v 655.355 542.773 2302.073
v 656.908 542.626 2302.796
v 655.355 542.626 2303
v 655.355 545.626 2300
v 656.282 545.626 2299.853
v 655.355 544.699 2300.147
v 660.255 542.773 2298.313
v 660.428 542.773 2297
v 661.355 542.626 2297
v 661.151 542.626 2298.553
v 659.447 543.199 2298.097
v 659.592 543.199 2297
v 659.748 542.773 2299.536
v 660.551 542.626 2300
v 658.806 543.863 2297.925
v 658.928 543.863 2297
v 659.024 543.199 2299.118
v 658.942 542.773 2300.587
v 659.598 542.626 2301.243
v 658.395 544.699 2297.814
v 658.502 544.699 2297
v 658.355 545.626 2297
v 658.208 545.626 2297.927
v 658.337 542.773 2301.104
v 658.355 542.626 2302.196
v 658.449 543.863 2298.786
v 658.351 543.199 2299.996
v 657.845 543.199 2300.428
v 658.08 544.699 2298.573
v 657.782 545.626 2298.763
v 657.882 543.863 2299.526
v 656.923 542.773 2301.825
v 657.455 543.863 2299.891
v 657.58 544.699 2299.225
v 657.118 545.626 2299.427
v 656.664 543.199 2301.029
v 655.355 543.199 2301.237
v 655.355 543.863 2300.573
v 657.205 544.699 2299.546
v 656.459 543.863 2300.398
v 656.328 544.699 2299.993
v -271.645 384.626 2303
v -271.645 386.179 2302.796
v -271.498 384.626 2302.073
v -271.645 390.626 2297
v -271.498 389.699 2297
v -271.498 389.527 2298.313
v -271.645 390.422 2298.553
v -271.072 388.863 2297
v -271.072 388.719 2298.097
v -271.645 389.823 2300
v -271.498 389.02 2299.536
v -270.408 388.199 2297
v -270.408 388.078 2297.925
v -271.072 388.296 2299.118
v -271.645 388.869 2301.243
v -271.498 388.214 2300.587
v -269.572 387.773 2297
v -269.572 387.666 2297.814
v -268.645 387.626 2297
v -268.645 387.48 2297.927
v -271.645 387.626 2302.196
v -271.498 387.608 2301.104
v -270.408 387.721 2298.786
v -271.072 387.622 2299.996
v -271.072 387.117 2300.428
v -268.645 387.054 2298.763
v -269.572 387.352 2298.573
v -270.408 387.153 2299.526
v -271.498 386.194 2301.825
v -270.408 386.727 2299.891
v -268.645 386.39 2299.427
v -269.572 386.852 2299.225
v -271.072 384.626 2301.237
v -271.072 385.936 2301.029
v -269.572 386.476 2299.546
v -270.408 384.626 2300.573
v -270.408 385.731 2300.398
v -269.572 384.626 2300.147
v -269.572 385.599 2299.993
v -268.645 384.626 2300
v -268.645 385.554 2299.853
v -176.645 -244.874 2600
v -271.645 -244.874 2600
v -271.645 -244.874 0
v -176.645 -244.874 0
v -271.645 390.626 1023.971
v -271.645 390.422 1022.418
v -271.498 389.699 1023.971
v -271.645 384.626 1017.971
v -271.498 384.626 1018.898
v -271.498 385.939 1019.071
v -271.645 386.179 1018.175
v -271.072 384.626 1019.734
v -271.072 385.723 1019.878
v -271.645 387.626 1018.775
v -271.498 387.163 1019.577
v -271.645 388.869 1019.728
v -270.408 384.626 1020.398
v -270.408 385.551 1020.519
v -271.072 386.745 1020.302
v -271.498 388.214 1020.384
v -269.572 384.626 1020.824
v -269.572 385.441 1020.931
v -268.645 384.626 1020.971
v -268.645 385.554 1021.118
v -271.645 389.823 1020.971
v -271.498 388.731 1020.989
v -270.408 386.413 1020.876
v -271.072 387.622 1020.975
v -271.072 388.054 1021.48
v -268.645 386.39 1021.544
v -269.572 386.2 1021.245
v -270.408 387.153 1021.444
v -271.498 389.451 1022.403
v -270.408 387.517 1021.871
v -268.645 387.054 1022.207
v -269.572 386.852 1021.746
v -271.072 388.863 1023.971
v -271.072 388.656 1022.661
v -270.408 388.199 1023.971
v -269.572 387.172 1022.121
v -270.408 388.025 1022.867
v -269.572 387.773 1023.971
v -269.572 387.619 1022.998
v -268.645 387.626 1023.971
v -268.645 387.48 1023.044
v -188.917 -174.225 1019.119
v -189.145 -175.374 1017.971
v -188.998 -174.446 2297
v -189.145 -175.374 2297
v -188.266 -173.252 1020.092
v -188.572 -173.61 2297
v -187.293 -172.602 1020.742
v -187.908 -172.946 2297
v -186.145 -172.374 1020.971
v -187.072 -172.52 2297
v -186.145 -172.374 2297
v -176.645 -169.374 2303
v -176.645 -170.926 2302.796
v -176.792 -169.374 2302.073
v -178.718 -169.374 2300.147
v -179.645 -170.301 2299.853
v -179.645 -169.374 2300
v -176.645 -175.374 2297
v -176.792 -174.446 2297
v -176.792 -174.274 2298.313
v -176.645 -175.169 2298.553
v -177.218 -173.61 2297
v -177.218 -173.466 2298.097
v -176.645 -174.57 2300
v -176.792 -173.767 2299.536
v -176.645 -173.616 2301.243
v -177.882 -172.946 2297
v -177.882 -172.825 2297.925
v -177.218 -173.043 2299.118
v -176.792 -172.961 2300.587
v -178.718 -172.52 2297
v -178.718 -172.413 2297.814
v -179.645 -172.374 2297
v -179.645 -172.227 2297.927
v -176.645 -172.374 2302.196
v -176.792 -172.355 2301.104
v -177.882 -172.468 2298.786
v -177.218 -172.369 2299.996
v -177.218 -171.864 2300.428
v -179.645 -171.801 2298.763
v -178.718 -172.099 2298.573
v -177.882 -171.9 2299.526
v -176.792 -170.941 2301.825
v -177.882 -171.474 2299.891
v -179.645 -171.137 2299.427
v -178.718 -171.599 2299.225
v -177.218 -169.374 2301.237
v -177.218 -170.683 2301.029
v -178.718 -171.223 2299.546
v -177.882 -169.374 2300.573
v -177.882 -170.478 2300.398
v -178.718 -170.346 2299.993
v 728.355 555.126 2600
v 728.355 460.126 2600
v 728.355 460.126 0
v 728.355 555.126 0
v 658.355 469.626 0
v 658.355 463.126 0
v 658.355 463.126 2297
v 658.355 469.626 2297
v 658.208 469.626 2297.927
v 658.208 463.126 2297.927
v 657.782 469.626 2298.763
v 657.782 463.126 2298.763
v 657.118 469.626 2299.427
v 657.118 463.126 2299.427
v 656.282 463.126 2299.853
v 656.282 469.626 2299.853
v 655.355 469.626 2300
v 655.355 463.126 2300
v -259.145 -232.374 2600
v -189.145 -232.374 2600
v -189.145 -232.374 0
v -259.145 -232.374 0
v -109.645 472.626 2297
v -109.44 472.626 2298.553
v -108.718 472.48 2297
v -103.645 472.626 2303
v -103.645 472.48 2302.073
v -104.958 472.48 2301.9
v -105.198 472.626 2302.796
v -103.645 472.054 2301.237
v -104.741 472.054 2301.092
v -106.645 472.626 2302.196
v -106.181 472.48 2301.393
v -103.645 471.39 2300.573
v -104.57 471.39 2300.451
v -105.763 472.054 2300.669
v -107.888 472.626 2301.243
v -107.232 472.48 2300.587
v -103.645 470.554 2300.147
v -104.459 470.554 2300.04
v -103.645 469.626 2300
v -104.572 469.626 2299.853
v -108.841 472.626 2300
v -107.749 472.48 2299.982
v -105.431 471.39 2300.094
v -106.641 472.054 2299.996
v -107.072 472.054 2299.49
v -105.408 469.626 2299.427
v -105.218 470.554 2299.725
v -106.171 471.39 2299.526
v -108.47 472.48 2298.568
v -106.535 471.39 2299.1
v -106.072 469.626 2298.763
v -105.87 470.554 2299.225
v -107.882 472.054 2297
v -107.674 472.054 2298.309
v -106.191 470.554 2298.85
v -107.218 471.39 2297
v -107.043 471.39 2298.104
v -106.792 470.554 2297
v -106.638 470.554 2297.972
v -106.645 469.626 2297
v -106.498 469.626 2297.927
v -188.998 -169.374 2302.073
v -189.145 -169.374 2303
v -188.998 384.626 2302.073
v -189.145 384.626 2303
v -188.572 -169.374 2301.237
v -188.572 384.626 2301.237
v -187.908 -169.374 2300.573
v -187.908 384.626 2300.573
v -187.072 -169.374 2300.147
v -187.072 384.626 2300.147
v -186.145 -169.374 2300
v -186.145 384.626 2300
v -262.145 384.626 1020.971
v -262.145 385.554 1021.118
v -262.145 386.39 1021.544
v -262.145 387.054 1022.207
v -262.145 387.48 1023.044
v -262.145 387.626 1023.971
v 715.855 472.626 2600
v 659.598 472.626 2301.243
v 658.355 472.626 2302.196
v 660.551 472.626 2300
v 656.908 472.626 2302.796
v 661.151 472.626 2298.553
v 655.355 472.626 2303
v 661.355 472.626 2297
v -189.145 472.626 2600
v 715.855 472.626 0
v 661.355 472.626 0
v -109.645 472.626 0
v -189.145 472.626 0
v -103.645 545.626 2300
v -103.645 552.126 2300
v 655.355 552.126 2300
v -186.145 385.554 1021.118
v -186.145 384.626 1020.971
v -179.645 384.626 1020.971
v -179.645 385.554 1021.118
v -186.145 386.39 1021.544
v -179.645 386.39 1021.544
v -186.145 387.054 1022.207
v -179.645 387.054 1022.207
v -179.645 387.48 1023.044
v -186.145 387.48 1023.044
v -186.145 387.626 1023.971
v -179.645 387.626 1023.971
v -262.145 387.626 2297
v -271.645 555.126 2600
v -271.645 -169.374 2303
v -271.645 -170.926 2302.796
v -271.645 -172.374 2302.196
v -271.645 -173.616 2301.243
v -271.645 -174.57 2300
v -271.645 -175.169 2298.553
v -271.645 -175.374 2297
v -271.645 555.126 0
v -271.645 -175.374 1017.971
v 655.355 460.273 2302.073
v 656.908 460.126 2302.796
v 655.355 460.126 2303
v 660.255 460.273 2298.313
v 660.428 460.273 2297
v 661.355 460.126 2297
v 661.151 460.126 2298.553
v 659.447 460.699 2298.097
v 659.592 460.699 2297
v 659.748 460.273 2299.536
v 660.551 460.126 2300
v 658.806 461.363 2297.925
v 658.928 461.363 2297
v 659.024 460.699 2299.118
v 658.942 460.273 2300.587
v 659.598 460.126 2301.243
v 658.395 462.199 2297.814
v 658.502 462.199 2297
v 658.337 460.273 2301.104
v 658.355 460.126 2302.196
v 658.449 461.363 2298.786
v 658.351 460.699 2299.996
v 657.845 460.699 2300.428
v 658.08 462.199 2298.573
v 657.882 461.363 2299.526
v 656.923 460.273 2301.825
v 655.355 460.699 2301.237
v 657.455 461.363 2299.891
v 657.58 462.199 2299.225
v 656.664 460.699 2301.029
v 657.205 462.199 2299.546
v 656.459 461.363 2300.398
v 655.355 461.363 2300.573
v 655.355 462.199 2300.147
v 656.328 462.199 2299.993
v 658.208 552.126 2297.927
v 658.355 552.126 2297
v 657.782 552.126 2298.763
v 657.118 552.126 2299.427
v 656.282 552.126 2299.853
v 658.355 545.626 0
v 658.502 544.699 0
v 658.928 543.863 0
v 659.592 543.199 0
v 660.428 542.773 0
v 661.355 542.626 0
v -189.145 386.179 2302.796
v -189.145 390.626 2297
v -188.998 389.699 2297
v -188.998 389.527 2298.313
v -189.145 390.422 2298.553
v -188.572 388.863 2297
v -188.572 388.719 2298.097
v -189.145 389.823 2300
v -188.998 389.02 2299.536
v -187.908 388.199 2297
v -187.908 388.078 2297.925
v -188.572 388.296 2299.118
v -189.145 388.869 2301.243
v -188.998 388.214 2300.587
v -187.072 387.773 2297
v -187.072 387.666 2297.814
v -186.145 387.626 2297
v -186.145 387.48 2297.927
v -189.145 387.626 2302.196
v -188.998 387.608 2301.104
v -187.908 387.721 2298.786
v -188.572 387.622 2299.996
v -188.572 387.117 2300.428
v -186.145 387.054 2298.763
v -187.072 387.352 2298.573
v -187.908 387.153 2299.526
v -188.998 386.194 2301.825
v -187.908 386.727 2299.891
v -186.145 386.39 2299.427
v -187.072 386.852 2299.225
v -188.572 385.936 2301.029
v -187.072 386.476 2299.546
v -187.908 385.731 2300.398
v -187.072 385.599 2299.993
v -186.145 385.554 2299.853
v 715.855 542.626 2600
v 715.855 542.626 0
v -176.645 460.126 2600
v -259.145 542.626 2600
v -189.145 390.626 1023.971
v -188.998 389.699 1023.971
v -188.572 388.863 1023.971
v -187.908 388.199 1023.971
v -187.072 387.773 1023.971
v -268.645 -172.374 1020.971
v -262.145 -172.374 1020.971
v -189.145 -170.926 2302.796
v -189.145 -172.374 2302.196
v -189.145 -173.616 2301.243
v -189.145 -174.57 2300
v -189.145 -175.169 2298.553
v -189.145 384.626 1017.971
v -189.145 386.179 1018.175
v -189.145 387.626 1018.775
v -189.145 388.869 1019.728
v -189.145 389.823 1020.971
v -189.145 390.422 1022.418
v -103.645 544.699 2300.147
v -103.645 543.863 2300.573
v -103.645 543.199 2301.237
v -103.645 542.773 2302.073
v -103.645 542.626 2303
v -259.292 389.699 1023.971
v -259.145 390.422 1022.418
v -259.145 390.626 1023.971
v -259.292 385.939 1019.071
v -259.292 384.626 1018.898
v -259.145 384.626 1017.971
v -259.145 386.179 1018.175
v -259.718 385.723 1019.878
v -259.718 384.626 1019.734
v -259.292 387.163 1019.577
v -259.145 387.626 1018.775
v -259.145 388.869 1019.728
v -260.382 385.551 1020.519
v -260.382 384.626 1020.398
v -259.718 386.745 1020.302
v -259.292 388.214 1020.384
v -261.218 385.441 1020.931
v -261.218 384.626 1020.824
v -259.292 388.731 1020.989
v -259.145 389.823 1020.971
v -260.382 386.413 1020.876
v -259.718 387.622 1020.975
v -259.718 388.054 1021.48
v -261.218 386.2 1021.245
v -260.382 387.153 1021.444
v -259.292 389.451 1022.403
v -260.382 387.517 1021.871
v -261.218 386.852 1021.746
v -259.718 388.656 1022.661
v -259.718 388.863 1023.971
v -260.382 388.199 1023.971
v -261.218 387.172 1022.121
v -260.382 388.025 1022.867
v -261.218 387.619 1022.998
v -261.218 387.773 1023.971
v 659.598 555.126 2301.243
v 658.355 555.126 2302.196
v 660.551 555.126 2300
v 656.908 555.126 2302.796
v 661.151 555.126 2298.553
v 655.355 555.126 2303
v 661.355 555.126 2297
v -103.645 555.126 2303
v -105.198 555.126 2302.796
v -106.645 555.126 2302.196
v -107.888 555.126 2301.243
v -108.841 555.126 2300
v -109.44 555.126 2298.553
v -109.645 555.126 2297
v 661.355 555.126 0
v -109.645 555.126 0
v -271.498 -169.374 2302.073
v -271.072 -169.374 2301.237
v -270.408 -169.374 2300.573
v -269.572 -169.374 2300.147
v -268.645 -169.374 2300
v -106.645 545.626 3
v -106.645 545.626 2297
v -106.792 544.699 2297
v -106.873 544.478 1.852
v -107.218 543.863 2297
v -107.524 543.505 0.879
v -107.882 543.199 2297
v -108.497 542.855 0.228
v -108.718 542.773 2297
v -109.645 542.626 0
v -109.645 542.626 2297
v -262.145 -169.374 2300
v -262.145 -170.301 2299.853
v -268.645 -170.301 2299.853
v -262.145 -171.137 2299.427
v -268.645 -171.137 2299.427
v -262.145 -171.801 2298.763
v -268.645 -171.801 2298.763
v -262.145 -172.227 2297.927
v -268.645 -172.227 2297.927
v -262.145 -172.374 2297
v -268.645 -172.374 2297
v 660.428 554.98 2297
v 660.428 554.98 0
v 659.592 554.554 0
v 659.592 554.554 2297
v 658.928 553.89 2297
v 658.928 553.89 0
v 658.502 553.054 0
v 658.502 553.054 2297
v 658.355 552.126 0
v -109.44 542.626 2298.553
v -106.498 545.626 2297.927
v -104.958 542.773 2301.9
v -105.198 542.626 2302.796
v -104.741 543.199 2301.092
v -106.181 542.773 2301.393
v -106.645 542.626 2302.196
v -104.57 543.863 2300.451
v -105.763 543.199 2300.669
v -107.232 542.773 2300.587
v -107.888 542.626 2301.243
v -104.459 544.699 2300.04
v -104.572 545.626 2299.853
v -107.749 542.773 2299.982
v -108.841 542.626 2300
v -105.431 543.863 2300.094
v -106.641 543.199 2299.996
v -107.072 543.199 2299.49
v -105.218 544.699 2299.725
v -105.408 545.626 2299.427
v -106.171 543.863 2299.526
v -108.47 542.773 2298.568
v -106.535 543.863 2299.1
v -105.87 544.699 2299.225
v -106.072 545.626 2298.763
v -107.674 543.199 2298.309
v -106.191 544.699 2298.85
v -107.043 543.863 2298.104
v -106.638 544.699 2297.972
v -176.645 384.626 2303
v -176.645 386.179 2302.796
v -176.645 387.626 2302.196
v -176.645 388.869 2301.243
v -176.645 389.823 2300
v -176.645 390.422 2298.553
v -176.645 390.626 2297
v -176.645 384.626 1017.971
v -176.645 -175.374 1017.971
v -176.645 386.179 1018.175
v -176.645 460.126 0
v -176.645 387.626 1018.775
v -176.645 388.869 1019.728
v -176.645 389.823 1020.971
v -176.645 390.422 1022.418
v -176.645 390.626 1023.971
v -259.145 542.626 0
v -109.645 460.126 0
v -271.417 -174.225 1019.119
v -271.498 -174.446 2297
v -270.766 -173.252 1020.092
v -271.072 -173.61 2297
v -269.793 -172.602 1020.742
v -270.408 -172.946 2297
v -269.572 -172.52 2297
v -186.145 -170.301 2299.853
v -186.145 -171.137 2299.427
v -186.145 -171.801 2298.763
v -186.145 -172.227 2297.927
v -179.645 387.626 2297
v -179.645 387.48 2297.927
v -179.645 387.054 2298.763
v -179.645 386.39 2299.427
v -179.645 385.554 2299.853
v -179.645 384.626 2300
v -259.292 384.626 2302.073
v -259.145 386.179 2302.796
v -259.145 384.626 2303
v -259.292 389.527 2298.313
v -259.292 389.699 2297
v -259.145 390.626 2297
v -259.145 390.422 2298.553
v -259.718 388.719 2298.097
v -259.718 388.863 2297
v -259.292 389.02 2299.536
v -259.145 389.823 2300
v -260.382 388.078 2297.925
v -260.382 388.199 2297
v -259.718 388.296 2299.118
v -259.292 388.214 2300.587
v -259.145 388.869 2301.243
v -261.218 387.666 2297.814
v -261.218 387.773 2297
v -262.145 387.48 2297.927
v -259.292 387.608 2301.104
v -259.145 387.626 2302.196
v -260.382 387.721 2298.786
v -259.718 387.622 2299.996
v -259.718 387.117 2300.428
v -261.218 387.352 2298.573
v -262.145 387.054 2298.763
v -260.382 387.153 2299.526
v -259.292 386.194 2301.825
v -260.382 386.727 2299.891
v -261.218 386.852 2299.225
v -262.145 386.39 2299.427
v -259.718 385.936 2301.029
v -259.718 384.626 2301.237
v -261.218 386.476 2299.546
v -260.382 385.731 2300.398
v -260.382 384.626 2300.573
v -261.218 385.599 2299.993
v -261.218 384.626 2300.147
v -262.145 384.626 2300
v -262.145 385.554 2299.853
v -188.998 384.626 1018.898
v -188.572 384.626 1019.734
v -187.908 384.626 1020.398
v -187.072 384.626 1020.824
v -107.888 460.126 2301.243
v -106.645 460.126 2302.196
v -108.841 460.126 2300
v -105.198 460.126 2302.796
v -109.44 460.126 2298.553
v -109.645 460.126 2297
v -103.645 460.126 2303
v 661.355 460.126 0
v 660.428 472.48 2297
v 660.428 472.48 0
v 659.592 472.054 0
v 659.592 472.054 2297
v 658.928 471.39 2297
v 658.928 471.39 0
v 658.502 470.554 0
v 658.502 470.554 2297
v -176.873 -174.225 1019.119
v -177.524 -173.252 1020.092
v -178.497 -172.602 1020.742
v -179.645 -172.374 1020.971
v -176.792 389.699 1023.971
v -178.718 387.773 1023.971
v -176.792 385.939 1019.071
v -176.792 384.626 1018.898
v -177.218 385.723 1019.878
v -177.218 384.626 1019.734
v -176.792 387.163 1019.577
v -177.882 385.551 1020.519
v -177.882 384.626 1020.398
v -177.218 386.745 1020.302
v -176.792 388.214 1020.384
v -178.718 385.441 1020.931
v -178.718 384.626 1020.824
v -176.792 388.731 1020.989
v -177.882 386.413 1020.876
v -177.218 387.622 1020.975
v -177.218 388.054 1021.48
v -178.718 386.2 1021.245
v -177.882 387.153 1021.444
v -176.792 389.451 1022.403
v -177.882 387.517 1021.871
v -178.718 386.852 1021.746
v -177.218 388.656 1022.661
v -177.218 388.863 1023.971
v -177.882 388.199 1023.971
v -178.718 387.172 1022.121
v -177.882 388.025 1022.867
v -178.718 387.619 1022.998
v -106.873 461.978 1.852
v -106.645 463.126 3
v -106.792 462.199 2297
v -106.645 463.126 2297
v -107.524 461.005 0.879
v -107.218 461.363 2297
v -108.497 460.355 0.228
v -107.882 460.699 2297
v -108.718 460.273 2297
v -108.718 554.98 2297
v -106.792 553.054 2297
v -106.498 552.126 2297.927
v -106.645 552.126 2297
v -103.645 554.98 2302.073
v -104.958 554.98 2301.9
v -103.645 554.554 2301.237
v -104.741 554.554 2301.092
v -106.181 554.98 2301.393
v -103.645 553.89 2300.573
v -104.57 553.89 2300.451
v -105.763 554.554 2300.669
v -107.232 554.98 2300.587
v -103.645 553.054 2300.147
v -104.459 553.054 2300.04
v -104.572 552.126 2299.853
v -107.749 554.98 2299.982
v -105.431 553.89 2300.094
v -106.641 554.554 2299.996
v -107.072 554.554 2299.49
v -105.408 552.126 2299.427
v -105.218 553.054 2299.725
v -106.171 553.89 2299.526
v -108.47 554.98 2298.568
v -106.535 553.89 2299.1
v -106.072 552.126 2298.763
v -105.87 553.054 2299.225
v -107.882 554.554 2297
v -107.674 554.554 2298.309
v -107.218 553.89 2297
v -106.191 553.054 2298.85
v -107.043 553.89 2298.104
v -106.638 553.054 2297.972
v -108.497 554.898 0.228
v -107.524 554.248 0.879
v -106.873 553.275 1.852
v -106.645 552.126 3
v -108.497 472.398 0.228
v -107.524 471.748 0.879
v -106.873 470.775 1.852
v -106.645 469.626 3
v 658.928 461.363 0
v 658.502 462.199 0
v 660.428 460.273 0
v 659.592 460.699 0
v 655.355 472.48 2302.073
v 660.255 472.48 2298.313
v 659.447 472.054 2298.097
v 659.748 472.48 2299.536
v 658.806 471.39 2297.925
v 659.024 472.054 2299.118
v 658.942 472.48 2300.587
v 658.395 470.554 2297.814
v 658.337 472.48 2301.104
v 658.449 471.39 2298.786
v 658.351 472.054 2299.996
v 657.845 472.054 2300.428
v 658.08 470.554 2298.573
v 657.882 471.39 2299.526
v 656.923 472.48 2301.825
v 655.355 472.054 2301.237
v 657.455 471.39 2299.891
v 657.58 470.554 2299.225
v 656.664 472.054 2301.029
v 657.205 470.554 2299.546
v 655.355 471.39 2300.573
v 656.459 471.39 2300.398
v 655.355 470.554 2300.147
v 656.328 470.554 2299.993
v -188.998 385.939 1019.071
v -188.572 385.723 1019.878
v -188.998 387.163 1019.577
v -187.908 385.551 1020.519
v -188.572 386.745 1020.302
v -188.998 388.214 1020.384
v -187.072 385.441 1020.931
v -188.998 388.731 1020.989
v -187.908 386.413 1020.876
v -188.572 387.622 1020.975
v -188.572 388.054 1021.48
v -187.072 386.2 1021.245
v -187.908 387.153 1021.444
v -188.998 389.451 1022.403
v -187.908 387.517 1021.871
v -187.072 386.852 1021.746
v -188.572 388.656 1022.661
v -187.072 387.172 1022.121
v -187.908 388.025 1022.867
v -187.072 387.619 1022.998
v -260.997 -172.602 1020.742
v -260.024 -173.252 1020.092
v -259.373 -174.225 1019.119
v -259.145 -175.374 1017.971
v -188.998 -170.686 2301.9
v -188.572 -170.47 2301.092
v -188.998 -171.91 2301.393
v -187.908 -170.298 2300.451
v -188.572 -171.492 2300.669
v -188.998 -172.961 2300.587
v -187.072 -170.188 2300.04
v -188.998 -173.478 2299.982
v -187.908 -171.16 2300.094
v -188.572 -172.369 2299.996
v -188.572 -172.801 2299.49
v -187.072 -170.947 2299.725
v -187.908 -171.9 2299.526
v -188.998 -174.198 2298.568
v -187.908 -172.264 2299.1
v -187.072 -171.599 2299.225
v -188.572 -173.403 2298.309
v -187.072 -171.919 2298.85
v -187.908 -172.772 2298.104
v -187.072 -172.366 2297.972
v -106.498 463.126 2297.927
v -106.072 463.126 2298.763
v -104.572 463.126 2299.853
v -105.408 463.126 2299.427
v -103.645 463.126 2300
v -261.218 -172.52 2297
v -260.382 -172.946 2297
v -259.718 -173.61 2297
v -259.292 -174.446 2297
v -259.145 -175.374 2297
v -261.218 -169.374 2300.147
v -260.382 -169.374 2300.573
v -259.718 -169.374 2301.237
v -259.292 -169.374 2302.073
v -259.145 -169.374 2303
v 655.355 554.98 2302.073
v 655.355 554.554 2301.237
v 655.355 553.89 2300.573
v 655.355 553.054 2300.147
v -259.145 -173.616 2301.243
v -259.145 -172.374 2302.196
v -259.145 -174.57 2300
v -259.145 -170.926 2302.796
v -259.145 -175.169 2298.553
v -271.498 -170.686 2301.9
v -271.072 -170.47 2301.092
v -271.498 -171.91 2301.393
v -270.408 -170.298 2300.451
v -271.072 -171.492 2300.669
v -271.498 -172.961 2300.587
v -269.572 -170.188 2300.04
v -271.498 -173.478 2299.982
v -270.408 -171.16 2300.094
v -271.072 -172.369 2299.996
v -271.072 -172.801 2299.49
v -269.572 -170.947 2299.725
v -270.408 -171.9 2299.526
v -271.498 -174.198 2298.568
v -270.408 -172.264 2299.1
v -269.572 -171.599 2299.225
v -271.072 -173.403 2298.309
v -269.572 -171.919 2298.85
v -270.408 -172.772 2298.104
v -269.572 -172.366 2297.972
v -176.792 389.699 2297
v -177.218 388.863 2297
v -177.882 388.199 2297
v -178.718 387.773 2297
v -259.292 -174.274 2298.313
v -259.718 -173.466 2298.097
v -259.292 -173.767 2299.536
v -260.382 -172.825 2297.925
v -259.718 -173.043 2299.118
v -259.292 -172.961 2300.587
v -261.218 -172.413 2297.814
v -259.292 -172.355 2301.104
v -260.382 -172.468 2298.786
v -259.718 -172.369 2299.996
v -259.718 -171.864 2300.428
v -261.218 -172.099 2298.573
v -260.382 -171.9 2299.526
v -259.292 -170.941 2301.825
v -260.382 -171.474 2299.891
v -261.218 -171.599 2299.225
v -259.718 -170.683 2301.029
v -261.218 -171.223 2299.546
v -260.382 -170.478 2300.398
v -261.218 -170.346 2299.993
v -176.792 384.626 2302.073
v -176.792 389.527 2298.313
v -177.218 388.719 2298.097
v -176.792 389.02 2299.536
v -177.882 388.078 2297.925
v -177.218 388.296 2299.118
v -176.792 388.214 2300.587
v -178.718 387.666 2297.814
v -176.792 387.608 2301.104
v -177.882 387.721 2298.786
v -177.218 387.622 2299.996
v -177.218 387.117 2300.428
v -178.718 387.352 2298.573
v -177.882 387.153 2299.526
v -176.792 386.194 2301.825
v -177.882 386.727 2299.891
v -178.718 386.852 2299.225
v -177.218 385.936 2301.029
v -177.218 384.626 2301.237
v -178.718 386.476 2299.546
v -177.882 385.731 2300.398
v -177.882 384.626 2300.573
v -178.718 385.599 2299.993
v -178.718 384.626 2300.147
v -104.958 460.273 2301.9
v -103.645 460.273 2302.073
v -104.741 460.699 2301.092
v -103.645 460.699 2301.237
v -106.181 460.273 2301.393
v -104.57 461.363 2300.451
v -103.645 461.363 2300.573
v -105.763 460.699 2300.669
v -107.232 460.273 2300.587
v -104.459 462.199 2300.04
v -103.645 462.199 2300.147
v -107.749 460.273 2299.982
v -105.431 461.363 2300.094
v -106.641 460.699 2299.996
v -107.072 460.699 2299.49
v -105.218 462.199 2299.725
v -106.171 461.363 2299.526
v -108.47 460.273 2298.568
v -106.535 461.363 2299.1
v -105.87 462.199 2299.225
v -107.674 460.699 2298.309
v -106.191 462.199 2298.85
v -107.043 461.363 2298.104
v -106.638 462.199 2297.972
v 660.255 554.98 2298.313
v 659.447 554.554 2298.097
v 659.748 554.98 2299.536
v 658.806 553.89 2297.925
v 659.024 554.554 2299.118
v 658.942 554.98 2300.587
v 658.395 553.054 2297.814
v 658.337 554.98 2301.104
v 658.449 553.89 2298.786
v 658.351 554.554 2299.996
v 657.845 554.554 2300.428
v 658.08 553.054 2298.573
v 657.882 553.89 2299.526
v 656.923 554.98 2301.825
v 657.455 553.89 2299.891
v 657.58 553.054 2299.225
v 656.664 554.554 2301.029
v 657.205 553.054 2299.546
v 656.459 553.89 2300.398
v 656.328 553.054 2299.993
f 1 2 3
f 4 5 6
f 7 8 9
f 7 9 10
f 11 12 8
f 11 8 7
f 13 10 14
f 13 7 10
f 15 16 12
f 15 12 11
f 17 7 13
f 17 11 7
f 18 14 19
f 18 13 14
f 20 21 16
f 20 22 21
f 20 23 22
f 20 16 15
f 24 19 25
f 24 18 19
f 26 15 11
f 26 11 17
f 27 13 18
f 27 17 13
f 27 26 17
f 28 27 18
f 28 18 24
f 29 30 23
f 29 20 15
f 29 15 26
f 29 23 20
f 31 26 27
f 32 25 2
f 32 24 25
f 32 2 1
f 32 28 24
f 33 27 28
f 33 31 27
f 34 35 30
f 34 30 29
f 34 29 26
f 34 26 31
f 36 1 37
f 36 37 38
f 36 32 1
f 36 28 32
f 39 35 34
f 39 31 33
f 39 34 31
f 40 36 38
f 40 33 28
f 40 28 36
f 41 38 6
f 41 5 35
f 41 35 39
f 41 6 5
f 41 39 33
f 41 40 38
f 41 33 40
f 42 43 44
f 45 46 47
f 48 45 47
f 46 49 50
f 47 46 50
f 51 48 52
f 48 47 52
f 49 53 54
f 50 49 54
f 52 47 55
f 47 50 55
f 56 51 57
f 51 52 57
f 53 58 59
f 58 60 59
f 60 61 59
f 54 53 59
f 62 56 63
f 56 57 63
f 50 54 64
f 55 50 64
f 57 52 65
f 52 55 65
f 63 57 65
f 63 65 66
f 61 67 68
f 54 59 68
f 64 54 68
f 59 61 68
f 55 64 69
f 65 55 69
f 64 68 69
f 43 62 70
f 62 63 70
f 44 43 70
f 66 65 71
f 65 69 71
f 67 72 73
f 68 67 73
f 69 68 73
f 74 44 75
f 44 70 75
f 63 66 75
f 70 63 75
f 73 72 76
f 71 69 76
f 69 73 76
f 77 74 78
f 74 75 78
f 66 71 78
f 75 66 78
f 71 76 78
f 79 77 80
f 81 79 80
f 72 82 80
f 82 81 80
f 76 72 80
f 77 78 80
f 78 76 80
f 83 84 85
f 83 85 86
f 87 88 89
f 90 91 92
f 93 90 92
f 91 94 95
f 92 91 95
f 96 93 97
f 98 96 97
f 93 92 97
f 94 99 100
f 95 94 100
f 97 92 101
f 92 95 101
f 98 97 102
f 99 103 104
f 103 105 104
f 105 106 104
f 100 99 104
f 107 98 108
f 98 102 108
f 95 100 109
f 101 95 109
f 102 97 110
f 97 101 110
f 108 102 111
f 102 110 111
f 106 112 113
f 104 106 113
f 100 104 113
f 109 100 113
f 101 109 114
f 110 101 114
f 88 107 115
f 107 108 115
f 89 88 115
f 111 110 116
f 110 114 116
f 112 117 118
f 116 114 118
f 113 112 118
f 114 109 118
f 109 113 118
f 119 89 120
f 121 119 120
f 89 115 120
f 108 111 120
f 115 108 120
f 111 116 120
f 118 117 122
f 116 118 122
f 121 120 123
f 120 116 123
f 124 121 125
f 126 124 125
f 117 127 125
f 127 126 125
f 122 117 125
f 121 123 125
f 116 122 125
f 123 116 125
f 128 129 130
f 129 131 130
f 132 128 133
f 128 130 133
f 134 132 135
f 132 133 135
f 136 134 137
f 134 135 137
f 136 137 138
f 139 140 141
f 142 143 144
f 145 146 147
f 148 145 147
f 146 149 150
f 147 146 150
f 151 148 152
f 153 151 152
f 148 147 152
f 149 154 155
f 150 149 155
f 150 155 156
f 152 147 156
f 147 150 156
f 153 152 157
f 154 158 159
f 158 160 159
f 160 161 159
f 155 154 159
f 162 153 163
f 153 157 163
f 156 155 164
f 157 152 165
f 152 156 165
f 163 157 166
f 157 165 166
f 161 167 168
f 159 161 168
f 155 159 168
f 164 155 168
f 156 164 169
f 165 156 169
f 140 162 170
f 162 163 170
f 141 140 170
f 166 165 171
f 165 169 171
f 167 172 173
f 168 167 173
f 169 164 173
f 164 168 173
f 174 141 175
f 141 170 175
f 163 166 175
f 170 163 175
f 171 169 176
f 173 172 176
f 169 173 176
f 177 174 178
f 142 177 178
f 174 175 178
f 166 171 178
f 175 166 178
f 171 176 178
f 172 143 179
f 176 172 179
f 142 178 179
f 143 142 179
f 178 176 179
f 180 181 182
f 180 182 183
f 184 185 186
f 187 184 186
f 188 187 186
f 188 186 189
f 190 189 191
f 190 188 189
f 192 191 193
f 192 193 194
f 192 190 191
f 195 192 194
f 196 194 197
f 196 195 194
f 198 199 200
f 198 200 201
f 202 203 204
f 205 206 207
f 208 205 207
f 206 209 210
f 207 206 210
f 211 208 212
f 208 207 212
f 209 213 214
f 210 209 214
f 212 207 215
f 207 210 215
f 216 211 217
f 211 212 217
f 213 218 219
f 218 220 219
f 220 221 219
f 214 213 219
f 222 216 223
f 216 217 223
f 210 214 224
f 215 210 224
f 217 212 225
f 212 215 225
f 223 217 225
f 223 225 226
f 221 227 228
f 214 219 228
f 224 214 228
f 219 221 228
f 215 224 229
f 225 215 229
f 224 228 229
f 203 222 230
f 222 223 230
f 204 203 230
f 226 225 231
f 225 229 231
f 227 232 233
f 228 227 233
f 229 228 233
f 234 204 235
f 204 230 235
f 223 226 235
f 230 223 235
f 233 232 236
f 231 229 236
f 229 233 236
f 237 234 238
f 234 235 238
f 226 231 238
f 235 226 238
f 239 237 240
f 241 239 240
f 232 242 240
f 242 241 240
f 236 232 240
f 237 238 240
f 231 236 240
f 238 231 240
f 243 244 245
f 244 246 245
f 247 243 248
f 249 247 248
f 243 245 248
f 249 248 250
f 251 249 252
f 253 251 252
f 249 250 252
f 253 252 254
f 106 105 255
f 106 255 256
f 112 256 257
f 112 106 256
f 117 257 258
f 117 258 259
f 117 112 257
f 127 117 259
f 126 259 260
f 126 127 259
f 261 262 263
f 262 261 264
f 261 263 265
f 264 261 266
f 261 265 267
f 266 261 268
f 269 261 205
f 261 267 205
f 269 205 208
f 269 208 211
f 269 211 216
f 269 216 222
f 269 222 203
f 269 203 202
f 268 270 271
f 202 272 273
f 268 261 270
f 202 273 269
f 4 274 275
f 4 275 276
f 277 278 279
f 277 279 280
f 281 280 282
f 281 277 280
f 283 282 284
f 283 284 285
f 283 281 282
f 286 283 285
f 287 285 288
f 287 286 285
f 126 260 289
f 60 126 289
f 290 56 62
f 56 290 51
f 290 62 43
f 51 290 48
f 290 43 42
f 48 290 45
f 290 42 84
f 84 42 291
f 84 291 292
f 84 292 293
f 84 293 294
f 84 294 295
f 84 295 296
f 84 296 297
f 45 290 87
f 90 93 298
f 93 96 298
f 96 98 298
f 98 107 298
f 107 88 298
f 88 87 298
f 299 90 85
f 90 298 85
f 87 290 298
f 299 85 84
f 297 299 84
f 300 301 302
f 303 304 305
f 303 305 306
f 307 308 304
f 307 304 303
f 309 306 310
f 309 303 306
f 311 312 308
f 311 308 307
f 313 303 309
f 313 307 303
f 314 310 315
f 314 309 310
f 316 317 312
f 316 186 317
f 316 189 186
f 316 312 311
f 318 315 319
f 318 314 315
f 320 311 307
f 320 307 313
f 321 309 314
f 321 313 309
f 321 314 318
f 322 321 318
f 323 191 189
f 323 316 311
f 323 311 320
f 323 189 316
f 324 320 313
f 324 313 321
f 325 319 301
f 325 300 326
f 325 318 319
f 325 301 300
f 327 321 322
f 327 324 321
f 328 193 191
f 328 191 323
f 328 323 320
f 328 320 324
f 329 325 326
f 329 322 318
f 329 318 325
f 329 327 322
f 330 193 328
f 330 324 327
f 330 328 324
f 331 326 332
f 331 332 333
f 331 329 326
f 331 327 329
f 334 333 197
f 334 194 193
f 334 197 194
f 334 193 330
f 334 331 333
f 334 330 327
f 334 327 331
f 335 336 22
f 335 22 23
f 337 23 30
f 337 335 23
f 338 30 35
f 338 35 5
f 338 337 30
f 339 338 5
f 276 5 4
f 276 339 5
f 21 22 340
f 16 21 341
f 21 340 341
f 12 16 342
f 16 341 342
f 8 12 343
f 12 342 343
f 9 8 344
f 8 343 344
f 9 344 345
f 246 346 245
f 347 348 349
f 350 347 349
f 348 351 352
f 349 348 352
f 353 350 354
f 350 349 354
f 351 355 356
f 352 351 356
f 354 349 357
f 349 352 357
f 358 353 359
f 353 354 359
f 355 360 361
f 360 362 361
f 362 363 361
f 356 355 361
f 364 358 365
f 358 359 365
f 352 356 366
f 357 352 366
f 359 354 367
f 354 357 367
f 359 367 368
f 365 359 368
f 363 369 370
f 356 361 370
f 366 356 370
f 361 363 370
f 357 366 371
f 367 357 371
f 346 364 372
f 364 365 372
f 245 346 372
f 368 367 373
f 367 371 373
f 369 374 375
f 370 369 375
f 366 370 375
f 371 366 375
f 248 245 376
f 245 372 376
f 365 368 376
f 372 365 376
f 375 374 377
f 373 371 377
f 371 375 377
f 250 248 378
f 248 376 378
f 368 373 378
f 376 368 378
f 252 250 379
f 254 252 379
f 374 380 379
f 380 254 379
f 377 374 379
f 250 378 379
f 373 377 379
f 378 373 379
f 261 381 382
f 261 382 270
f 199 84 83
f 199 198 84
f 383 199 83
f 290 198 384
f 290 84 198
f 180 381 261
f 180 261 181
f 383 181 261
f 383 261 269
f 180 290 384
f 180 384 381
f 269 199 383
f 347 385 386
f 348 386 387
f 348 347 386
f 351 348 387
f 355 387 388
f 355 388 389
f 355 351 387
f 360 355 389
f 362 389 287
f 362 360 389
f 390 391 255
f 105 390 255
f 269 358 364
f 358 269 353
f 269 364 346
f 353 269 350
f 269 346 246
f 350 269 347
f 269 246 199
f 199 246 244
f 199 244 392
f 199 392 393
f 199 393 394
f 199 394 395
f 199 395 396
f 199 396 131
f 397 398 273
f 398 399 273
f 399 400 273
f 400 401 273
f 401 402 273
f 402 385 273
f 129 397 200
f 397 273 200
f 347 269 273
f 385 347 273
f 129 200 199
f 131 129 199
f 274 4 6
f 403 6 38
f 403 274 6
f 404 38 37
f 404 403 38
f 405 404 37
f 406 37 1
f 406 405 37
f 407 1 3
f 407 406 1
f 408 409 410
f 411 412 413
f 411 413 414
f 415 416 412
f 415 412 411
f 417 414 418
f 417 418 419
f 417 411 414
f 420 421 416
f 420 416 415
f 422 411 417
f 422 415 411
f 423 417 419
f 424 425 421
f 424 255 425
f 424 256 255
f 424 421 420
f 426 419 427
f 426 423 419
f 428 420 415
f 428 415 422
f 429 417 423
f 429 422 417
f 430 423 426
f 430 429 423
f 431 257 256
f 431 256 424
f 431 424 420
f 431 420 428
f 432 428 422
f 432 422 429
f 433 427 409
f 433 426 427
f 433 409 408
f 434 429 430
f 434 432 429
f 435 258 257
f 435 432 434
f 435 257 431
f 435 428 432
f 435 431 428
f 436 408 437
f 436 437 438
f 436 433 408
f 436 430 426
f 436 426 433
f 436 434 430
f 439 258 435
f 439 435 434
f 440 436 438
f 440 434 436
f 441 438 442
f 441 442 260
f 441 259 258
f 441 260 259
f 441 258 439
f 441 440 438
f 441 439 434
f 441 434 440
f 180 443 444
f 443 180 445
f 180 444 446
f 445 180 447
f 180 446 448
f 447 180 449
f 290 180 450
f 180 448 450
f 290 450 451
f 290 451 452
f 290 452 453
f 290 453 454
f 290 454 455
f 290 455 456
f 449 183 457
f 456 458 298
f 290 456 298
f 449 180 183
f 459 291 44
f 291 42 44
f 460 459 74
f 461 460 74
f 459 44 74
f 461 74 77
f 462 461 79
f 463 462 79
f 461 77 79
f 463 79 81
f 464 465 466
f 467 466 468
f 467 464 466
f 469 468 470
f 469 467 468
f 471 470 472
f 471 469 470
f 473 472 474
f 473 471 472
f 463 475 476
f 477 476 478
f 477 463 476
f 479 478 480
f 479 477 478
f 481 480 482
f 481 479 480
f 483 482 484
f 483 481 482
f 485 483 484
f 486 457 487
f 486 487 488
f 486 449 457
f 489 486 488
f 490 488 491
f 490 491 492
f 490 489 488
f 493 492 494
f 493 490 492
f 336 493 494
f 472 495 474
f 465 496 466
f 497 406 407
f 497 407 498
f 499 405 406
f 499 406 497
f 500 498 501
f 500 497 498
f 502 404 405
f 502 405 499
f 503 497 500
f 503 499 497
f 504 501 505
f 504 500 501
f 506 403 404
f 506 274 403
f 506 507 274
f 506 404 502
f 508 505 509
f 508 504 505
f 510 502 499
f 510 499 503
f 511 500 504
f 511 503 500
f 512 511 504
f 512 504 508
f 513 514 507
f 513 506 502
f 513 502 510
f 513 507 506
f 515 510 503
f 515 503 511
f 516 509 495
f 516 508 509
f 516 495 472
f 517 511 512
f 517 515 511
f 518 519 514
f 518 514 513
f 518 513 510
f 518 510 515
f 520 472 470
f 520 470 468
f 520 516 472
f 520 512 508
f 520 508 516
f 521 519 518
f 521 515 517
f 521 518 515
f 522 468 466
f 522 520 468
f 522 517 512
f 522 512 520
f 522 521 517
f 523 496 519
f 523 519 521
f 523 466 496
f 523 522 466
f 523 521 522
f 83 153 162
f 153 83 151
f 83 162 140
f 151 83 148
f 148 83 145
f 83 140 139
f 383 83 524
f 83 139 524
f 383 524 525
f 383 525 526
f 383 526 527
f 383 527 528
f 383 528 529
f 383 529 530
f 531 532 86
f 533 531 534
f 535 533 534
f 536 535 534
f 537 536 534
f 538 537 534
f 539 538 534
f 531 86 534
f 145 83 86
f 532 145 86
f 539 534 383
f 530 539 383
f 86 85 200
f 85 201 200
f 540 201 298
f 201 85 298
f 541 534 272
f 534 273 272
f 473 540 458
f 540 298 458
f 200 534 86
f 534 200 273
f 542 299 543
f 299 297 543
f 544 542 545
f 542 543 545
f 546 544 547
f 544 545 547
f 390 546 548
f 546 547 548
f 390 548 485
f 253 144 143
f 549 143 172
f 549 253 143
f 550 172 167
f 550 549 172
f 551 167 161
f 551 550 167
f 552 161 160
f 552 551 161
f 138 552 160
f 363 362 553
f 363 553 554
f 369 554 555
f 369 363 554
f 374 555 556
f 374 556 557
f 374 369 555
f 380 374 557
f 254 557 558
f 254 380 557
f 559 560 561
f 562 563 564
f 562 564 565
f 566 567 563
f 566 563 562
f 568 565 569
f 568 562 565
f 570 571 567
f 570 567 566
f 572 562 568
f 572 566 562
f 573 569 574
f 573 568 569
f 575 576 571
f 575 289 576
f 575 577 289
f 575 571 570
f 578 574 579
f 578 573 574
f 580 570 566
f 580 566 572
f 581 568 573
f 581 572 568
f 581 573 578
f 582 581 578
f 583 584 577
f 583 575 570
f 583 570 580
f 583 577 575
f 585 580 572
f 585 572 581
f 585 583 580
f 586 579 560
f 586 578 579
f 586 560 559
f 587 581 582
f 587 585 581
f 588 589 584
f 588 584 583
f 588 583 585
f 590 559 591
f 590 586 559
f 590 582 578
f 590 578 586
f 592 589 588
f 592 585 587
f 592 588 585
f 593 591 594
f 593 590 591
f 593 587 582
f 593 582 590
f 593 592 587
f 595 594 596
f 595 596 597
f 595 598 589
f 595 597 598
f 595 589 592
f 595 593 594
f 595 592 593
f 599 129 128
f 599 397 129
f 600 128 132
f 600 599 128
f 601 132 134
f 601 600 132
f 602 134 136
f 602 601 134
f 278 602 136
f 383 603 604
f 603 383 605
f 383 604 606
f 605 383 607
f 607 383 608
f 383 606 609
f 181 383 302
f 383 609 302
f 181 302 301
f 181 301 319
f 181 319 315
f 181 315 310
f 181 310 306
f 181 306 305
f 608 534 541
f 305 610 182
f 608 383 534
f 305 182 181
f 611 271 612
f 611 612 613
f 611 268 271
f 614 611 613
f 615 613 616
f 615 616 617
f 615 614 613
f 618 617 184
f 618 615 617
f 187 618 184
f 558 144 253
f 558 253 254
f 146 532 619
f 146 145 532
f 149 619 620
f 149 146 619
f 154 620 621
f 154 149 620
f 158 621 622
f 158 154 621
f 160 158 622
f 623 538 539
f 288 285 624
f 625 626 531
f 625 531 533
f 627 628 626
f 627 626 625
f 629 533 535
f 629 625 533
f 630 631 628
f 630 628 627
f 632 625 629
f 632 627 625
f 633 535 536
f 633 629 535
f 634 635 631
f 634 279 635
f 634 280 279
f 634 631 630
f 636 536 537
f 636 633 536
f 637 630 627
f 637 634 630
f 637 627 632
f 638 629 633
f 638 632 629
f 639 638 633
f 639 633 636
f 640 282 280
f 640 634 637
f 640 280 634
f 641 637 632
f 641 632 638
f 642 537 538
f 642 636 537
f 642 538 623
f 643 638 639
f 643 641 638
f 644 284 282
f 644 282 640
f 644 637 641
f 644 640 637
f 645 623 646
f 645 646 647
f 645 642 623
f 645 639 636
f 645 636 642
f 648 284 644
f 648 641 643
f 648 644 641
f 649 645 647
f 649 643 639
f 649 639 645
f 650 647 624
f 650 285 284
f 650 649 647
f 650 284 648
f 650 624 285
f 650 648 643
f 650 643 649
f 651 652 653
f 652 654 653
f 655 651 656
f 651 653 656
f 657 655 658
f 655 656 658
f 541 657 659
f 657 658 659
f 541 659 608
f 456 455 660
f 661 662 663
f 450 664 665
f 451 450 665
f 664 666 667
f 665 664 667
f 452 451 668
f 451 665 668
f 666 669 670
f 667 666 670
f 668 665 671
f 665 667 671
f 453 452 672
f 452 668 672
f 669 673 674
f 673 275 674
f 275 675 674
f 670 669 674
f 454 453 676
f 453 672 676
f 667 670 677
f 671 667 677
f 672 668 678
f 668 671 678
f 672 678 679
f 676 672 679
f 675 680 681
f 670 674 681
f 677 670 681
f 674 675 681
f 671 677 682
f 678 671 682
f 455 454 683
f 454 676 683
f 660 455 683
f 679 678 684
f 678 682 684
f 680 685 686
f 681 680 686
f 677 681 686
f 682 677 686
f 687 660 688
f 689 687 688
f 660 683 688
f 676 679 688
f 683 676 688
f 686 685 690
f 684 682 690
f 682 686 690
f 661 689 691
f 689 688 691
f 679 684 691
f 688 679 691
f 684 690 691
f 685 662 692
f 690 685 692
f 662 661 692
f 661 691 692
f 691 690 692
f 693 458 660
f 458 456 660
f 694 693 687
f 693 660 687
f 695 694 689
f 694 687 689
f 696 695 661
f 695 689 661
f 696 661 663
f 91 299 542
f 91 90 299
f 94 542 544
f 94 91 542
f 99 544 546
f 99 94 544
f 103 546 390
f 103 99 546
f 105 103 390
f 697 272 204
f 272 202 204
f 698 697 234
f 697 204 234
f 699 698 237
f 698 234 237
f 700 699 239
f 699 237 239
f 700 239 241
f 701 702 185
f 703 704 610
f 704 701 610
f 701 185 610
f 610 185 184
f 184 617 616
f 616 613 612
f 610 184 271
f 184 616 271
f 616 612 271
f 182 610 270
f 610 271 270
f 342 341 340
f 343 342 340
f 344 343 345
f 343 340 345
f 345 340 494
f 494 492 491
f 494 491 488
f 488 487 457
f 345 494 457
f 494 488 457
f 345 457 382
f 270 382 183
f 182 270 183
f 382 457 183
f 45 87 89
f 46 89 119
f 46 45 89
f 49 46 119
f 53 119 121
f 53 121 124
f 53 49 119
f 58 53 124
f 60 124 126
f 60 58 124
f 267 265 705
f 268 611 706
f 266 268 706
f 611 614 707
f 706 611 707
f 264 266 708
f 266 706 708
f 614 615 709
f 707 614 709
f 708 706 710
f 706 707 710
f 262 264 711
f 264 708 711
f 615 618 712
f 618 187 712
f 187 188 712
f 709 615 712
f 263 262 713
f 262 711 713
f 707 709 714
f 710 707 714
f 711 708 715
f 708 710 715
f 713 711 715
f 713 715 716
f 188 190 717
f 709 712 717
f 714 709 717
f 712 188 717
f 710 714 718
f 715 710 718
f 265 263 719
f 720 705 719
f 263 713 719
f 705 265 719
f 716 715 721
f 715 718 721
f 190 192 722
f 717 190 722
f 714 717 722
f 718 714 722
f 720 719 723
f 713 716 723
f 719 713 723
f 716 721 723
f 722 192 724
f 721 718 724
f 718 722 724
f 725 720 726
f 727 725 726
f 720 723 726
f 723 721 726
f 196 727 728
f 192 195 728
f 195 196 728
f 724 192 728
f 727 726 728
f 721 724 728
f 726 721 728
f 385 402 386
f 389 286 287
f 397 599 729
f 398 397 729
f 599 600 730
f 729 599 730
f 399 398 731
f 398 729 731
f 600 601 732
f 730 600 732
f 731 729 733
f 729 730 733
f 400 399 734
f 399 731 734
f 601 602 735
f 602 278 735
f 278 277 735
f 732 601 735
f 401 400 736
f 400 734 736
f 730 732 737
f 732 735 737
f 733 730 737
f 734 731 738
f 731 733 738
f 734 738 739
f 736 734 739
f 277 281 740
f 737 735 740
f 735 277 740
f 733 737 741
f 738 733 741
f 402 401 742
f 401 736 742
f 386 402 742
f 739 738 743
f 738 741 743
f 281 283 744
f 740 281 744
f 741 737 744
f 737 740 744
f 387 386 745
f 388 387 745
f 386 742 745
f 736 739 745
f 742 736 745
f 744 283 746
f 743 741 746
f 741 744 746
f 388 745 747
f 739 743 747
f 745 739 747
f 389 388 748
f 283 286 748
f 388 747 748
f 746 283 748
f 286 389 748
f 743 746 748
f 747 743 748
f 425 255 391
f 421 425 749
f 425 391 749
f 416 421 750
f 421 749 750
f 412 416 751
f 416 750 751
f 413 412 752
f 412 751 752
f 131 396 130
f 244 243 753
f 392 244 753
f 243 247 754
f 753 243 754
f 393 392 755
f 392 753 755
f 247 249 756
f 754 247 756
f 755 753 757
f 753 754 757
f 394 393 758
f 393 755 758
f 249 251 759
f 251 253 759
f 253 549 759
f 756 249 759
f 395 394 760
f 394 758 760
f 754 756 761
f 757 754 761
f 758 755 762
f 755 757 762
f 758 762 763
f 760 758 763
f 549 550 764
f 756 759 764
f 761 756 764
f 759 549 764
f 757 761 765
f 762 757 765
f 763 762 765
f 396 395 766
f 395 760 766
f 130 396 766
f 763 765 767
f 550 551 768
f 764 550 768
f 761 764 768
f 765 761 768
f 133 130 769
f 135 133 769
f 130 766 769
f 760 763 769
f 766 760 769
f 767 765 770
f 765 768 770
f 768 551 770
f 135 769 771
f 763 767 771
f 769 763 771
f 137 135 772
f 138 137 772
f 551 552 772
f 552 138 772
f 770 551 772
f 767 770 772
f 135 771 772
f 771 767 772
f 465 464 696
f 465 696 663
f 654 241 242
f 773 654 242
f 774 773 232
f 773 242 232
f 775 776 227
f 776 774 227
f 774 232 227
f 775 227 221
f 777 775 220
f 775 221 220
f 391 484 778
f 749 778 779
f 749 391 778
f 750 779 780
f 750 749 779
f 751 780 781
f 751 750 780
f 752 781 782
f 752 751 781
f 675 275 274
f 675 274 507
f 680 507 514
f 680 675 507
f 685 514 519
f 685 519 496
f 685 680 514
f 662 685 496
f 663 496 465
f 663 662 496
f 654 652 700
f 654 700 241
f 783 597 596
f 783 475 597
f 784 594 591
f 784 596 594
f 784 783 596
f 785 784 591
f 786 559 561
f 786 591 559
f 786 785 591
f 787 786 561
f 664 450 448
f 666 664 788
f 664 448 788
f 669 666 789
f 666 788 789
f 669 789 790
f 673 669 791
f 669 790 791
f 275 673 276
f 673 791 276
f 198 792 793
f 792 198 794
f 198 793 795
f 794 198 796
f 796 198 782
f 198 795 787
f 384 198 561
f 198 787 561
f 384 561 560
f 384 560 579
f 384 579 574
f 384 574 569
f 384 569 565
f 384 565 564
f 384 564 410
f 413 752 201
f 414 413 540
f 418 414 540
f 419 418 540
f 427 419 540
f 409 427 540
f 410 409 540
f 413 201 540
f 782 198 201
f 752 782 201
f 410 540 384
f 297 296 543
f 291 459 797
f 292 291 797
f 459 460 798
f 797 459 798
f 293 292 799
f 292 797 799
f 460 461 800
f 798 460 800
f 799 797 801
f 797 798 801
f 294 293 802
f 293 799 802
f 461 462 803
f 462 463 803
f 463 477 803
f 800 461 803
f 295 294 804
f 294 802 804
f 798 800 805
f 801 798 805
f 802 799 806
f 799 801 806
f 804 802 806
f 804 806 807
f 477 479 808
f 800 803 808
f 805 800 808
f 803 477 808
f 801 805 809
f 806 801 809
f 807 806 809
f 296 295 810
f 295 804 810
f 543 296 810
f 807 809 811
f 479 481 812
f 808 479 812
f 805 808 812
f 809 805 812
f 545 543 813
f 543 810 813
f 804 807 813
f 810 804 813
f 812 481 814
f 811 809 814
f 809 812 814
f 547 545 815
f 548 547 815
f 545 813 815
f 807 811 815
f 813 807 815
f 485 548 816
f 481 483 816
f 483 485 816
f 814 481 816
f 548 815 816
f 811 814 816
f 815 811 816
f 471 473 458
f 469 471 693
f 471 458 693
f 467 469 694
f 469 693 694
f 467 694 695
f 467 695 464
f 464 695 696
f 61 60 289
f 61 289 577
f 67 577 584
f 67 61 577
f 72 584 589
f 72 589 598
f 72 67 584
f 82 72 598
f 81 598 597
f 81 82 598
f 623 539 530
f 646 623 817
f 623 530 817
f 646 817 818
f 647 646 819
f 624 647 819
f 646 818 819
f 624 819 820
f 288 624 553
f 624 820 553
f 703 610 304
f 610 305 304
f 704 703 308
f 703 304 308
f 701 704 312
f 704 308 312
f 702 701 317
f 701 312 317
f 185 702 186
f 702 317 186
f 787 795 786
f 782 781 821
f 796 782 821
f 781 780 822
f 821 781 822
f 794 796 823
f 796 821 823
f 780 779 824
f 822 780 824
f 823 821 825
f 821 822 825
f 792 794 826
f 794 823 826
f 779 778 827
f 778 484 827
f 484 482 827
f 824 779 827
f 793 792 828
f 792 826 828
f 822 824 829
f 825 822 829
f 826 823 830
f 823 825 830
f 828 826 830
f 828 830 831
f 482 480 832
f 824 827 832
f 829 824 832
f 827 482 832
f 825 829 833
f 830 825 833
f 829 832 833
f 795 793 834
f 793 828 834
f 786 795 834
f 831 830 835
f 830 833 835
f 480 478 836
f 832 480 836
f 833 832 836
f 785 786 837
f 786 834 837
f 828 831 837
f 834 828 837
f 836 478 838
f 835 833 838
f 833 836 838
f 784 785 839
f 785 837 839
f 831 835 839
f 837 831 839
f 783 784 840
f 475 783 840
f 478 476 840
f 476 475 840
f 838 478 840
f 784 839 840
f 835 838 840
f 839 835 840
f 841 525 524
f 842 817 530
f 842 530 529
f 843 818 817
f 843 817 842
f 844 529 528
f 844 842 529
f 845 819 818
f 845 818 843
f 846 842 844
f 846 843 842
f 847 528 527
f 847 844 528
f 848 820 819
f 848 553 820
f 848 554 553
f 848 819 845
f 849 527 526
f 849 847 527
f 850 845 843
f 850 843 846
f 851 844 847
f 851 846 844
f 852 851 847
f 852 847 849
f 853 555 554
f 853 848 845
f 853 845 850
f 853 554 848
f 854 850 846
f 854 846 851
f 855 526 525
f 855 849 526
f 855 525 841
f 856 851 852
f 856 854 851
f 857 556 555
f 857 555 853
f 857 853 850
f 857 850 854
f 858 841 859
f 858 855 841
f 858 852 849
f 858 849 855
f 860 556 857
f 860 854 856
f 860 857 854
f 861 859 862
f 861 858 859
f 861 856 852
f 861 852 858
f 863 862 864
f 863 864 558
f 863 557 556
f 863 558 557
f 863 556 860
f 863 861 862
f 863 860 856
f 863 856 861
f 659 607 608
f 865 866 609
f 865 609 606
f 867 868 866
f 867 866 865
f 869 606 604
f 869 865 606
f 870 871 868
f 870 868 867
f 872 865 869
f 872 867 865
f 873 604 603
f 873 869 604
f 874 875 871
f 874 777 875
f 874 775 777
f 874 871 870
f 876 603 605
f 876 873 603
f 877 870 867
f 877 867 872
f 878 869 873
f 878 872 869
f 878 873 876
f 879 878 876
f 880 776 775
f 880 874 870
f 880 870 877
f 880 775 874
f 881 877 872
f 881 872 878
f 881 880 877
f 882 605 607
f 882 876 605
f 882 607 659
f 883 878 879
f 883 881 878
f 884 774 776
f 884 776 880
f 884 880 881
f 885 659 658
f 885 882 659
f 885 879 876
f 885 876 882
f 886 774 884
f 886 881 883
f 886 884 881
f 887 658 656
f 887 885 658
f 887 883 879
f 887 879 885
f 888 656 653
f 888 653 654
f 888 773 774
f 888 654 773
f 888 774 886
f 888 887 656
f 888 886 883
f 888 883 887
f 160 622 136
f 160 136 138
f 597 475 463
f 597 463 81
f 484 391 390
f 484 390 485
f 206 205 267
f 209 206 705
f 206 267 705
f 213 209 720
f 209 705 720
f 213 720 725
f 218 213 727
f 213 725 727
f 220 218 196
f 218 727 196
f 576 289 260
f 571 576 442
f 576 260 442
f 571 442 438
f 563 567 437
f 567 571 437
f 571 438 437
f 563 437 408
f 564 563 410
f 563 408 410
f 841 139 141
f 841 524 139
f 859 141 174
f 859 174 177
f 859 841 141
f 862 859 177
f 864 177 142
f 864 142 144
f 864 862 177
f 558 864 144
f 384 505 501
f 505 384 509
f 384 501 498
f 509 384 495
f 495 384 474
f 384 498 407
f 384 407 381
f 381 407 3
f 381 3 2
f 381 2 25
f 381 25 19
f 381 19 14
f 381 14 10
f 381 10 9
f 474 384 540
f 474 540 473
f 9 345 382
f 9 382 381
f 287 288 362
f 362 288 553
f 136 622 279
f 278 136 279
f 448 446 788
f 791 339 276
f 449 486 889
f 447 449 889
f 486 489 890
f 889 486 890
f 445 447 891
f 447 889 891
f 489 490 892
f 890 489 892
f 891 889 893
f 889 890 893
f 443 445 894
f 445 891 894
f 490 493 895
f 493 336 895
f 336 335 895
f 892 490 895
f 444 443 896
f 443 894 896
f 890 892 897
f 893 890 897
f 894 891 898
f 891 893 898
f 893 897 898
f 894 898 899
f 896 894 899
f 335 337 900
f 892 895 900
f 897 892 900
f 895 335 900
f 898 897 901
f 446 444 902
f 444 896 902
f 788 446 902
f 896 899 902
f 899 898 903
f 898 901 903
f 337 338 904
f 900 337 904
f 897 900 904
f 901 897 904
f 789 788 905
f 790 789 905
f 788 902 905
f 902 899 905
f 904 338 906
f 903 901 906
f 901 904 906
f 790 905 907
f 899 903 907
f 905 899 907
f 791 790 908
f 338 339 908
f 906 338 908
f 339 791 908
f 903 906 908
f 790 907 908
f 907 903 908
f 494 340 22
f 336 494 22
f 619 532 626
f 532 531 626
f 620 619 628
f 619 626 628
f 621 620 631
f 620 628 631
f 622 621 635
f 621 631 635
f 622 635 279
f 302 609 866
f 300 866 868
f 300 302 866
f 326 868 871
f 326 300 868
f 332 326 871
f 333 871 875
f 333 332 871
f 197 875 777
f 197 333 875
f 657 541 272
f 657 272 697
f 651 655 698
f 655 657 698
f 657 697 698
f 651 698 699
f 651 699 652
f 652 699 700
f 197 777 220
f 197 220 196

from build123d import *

# Parameters (mm, degrees)
F1_DEPTH = 2600
F2_W     = 560
F2_H     = 1279.0293264389
F3_DEPTH = 95.001
F4_W     = 765
F4_H     = 2300
F5_DEPTH = 95.001
F6_R     = 3


with BuildPart() as f1:
    # F0 (on Top) → F1 (new body)
    with BuildSketch(Plane.XY):
        Polygon((-271.6449069816, 555.1264761336), (-271.6449069816, -244.8735238664), (-176.6449069816, -244.8735238664), (-176.6449069816, 460.1264761336), (728.3550930184, 460.1264761336), (728.3550930184, 555.1264761336), align=None)
        Polygon((-259.1449069816, 542.6264761336), (715.8550930184, 542.6264761336), (715.8550930184, 472.6264761336), (-189.1449069816, 472.6264761336), (-189.1449069816, -232.3735238664), (-259.1449069816, -232.3735238664), align=None, mode=Mode.SUBTRACT)
    extrude(amount=F1_DEPTH)

    # F2 (on face) → F3 (cut, through all)
    with BuildSketch(Plane.YZ.offset(-176.6449069816)):
        with Locations((107.6264761336, 1660.4853367805)):
            Rectangle(F2_W, F2_H)
    extrude(amount=-F3_DEPTH, mode=Mode.SUBTRACT)

    # F4 (on face) → F5 (cut, through all)
    with BuildSketch(Plane.XZ.offset(-460.1264761336)):
        with Locations((275.8550930184, 1150)):
            Rectangle(F4_W, F4_H)
    extrude(amount=-F5_DEPTH, mode=Mode.SUBTRACT)

    # F6
    f6_edges = [f1.edges().sort_by_distance(p)[0] for p in [
        (-106.644907, 542.626476, 1150),
        (-106.644907, 548.876476, 0),
        (-106.644907, 555.126476, 1150),
        (-106.644907, 548.876476, 2300),
        (-106.644907, 460.126476, 1150),
        (-106.644907, 466.376476, 0),
        (-106.644907, 472.626476, 1150),
        (-106.644907, 466.376476, 2300),
        (275.855093, 542.626476, 2300),
        (275.855093, 555.126476, 2300),
        (658.355093, 548.876476, 2300),
        (275.855093, 460.126476, 2300),
        (275.855093, 472.626476, 2300),
        (658.355093, 466.376476, 2300),
        (-259.144907, 107.626476, 2300),
        (-265.394907, -172.373524, 2300),
        (-271.644907, 107.626476, 2300),
        (-265.394907, 387.626476, 2300),
        (-176.644907, 107.626476, 2300),
        (-182.894907, -172.373524, 2300),
        (-189.144907, 107.626476, 2300),
        (-182.894907, 387.626476, 2300),
        (-259.144907, 387.626476, 1660.485337),
        (-271.644907, 387.626476, 1660.485337),
        (-265.394907, 387.626476, 1020.970674),
        (-176.644907, 387.626476, 1660.485337),
        (-189.144907, 387.626476, 1660.485337),
        (-182.894907, 387.626476, 1020.970674),
        (-271.644907, -172.373524, 1660.485337),
        (-271.644907, 107.626476, 1020.970674),
        (658.355093, 555.126476, 1150),
        (-259.144907, -172.373524, 1660.485337),
        (-259.144907, 107.626476, 1020.970674),
        (658.355093, 542.626476, 1150),
        (-189.144907, -172.373524, 1660.485337),
        (-189.144907, 107.626476, 1020.970674),
        (658.355093, 472.626476, 1150),
        (658.355093, 460.126476, 1150),
        (-176.644907, 107.626476, 1020.970674),
        (-176.644907, -172.373524, 1660.485337),
    ]]
    fillet(f6_edges, radius=F6_R)


solid = f1.part
